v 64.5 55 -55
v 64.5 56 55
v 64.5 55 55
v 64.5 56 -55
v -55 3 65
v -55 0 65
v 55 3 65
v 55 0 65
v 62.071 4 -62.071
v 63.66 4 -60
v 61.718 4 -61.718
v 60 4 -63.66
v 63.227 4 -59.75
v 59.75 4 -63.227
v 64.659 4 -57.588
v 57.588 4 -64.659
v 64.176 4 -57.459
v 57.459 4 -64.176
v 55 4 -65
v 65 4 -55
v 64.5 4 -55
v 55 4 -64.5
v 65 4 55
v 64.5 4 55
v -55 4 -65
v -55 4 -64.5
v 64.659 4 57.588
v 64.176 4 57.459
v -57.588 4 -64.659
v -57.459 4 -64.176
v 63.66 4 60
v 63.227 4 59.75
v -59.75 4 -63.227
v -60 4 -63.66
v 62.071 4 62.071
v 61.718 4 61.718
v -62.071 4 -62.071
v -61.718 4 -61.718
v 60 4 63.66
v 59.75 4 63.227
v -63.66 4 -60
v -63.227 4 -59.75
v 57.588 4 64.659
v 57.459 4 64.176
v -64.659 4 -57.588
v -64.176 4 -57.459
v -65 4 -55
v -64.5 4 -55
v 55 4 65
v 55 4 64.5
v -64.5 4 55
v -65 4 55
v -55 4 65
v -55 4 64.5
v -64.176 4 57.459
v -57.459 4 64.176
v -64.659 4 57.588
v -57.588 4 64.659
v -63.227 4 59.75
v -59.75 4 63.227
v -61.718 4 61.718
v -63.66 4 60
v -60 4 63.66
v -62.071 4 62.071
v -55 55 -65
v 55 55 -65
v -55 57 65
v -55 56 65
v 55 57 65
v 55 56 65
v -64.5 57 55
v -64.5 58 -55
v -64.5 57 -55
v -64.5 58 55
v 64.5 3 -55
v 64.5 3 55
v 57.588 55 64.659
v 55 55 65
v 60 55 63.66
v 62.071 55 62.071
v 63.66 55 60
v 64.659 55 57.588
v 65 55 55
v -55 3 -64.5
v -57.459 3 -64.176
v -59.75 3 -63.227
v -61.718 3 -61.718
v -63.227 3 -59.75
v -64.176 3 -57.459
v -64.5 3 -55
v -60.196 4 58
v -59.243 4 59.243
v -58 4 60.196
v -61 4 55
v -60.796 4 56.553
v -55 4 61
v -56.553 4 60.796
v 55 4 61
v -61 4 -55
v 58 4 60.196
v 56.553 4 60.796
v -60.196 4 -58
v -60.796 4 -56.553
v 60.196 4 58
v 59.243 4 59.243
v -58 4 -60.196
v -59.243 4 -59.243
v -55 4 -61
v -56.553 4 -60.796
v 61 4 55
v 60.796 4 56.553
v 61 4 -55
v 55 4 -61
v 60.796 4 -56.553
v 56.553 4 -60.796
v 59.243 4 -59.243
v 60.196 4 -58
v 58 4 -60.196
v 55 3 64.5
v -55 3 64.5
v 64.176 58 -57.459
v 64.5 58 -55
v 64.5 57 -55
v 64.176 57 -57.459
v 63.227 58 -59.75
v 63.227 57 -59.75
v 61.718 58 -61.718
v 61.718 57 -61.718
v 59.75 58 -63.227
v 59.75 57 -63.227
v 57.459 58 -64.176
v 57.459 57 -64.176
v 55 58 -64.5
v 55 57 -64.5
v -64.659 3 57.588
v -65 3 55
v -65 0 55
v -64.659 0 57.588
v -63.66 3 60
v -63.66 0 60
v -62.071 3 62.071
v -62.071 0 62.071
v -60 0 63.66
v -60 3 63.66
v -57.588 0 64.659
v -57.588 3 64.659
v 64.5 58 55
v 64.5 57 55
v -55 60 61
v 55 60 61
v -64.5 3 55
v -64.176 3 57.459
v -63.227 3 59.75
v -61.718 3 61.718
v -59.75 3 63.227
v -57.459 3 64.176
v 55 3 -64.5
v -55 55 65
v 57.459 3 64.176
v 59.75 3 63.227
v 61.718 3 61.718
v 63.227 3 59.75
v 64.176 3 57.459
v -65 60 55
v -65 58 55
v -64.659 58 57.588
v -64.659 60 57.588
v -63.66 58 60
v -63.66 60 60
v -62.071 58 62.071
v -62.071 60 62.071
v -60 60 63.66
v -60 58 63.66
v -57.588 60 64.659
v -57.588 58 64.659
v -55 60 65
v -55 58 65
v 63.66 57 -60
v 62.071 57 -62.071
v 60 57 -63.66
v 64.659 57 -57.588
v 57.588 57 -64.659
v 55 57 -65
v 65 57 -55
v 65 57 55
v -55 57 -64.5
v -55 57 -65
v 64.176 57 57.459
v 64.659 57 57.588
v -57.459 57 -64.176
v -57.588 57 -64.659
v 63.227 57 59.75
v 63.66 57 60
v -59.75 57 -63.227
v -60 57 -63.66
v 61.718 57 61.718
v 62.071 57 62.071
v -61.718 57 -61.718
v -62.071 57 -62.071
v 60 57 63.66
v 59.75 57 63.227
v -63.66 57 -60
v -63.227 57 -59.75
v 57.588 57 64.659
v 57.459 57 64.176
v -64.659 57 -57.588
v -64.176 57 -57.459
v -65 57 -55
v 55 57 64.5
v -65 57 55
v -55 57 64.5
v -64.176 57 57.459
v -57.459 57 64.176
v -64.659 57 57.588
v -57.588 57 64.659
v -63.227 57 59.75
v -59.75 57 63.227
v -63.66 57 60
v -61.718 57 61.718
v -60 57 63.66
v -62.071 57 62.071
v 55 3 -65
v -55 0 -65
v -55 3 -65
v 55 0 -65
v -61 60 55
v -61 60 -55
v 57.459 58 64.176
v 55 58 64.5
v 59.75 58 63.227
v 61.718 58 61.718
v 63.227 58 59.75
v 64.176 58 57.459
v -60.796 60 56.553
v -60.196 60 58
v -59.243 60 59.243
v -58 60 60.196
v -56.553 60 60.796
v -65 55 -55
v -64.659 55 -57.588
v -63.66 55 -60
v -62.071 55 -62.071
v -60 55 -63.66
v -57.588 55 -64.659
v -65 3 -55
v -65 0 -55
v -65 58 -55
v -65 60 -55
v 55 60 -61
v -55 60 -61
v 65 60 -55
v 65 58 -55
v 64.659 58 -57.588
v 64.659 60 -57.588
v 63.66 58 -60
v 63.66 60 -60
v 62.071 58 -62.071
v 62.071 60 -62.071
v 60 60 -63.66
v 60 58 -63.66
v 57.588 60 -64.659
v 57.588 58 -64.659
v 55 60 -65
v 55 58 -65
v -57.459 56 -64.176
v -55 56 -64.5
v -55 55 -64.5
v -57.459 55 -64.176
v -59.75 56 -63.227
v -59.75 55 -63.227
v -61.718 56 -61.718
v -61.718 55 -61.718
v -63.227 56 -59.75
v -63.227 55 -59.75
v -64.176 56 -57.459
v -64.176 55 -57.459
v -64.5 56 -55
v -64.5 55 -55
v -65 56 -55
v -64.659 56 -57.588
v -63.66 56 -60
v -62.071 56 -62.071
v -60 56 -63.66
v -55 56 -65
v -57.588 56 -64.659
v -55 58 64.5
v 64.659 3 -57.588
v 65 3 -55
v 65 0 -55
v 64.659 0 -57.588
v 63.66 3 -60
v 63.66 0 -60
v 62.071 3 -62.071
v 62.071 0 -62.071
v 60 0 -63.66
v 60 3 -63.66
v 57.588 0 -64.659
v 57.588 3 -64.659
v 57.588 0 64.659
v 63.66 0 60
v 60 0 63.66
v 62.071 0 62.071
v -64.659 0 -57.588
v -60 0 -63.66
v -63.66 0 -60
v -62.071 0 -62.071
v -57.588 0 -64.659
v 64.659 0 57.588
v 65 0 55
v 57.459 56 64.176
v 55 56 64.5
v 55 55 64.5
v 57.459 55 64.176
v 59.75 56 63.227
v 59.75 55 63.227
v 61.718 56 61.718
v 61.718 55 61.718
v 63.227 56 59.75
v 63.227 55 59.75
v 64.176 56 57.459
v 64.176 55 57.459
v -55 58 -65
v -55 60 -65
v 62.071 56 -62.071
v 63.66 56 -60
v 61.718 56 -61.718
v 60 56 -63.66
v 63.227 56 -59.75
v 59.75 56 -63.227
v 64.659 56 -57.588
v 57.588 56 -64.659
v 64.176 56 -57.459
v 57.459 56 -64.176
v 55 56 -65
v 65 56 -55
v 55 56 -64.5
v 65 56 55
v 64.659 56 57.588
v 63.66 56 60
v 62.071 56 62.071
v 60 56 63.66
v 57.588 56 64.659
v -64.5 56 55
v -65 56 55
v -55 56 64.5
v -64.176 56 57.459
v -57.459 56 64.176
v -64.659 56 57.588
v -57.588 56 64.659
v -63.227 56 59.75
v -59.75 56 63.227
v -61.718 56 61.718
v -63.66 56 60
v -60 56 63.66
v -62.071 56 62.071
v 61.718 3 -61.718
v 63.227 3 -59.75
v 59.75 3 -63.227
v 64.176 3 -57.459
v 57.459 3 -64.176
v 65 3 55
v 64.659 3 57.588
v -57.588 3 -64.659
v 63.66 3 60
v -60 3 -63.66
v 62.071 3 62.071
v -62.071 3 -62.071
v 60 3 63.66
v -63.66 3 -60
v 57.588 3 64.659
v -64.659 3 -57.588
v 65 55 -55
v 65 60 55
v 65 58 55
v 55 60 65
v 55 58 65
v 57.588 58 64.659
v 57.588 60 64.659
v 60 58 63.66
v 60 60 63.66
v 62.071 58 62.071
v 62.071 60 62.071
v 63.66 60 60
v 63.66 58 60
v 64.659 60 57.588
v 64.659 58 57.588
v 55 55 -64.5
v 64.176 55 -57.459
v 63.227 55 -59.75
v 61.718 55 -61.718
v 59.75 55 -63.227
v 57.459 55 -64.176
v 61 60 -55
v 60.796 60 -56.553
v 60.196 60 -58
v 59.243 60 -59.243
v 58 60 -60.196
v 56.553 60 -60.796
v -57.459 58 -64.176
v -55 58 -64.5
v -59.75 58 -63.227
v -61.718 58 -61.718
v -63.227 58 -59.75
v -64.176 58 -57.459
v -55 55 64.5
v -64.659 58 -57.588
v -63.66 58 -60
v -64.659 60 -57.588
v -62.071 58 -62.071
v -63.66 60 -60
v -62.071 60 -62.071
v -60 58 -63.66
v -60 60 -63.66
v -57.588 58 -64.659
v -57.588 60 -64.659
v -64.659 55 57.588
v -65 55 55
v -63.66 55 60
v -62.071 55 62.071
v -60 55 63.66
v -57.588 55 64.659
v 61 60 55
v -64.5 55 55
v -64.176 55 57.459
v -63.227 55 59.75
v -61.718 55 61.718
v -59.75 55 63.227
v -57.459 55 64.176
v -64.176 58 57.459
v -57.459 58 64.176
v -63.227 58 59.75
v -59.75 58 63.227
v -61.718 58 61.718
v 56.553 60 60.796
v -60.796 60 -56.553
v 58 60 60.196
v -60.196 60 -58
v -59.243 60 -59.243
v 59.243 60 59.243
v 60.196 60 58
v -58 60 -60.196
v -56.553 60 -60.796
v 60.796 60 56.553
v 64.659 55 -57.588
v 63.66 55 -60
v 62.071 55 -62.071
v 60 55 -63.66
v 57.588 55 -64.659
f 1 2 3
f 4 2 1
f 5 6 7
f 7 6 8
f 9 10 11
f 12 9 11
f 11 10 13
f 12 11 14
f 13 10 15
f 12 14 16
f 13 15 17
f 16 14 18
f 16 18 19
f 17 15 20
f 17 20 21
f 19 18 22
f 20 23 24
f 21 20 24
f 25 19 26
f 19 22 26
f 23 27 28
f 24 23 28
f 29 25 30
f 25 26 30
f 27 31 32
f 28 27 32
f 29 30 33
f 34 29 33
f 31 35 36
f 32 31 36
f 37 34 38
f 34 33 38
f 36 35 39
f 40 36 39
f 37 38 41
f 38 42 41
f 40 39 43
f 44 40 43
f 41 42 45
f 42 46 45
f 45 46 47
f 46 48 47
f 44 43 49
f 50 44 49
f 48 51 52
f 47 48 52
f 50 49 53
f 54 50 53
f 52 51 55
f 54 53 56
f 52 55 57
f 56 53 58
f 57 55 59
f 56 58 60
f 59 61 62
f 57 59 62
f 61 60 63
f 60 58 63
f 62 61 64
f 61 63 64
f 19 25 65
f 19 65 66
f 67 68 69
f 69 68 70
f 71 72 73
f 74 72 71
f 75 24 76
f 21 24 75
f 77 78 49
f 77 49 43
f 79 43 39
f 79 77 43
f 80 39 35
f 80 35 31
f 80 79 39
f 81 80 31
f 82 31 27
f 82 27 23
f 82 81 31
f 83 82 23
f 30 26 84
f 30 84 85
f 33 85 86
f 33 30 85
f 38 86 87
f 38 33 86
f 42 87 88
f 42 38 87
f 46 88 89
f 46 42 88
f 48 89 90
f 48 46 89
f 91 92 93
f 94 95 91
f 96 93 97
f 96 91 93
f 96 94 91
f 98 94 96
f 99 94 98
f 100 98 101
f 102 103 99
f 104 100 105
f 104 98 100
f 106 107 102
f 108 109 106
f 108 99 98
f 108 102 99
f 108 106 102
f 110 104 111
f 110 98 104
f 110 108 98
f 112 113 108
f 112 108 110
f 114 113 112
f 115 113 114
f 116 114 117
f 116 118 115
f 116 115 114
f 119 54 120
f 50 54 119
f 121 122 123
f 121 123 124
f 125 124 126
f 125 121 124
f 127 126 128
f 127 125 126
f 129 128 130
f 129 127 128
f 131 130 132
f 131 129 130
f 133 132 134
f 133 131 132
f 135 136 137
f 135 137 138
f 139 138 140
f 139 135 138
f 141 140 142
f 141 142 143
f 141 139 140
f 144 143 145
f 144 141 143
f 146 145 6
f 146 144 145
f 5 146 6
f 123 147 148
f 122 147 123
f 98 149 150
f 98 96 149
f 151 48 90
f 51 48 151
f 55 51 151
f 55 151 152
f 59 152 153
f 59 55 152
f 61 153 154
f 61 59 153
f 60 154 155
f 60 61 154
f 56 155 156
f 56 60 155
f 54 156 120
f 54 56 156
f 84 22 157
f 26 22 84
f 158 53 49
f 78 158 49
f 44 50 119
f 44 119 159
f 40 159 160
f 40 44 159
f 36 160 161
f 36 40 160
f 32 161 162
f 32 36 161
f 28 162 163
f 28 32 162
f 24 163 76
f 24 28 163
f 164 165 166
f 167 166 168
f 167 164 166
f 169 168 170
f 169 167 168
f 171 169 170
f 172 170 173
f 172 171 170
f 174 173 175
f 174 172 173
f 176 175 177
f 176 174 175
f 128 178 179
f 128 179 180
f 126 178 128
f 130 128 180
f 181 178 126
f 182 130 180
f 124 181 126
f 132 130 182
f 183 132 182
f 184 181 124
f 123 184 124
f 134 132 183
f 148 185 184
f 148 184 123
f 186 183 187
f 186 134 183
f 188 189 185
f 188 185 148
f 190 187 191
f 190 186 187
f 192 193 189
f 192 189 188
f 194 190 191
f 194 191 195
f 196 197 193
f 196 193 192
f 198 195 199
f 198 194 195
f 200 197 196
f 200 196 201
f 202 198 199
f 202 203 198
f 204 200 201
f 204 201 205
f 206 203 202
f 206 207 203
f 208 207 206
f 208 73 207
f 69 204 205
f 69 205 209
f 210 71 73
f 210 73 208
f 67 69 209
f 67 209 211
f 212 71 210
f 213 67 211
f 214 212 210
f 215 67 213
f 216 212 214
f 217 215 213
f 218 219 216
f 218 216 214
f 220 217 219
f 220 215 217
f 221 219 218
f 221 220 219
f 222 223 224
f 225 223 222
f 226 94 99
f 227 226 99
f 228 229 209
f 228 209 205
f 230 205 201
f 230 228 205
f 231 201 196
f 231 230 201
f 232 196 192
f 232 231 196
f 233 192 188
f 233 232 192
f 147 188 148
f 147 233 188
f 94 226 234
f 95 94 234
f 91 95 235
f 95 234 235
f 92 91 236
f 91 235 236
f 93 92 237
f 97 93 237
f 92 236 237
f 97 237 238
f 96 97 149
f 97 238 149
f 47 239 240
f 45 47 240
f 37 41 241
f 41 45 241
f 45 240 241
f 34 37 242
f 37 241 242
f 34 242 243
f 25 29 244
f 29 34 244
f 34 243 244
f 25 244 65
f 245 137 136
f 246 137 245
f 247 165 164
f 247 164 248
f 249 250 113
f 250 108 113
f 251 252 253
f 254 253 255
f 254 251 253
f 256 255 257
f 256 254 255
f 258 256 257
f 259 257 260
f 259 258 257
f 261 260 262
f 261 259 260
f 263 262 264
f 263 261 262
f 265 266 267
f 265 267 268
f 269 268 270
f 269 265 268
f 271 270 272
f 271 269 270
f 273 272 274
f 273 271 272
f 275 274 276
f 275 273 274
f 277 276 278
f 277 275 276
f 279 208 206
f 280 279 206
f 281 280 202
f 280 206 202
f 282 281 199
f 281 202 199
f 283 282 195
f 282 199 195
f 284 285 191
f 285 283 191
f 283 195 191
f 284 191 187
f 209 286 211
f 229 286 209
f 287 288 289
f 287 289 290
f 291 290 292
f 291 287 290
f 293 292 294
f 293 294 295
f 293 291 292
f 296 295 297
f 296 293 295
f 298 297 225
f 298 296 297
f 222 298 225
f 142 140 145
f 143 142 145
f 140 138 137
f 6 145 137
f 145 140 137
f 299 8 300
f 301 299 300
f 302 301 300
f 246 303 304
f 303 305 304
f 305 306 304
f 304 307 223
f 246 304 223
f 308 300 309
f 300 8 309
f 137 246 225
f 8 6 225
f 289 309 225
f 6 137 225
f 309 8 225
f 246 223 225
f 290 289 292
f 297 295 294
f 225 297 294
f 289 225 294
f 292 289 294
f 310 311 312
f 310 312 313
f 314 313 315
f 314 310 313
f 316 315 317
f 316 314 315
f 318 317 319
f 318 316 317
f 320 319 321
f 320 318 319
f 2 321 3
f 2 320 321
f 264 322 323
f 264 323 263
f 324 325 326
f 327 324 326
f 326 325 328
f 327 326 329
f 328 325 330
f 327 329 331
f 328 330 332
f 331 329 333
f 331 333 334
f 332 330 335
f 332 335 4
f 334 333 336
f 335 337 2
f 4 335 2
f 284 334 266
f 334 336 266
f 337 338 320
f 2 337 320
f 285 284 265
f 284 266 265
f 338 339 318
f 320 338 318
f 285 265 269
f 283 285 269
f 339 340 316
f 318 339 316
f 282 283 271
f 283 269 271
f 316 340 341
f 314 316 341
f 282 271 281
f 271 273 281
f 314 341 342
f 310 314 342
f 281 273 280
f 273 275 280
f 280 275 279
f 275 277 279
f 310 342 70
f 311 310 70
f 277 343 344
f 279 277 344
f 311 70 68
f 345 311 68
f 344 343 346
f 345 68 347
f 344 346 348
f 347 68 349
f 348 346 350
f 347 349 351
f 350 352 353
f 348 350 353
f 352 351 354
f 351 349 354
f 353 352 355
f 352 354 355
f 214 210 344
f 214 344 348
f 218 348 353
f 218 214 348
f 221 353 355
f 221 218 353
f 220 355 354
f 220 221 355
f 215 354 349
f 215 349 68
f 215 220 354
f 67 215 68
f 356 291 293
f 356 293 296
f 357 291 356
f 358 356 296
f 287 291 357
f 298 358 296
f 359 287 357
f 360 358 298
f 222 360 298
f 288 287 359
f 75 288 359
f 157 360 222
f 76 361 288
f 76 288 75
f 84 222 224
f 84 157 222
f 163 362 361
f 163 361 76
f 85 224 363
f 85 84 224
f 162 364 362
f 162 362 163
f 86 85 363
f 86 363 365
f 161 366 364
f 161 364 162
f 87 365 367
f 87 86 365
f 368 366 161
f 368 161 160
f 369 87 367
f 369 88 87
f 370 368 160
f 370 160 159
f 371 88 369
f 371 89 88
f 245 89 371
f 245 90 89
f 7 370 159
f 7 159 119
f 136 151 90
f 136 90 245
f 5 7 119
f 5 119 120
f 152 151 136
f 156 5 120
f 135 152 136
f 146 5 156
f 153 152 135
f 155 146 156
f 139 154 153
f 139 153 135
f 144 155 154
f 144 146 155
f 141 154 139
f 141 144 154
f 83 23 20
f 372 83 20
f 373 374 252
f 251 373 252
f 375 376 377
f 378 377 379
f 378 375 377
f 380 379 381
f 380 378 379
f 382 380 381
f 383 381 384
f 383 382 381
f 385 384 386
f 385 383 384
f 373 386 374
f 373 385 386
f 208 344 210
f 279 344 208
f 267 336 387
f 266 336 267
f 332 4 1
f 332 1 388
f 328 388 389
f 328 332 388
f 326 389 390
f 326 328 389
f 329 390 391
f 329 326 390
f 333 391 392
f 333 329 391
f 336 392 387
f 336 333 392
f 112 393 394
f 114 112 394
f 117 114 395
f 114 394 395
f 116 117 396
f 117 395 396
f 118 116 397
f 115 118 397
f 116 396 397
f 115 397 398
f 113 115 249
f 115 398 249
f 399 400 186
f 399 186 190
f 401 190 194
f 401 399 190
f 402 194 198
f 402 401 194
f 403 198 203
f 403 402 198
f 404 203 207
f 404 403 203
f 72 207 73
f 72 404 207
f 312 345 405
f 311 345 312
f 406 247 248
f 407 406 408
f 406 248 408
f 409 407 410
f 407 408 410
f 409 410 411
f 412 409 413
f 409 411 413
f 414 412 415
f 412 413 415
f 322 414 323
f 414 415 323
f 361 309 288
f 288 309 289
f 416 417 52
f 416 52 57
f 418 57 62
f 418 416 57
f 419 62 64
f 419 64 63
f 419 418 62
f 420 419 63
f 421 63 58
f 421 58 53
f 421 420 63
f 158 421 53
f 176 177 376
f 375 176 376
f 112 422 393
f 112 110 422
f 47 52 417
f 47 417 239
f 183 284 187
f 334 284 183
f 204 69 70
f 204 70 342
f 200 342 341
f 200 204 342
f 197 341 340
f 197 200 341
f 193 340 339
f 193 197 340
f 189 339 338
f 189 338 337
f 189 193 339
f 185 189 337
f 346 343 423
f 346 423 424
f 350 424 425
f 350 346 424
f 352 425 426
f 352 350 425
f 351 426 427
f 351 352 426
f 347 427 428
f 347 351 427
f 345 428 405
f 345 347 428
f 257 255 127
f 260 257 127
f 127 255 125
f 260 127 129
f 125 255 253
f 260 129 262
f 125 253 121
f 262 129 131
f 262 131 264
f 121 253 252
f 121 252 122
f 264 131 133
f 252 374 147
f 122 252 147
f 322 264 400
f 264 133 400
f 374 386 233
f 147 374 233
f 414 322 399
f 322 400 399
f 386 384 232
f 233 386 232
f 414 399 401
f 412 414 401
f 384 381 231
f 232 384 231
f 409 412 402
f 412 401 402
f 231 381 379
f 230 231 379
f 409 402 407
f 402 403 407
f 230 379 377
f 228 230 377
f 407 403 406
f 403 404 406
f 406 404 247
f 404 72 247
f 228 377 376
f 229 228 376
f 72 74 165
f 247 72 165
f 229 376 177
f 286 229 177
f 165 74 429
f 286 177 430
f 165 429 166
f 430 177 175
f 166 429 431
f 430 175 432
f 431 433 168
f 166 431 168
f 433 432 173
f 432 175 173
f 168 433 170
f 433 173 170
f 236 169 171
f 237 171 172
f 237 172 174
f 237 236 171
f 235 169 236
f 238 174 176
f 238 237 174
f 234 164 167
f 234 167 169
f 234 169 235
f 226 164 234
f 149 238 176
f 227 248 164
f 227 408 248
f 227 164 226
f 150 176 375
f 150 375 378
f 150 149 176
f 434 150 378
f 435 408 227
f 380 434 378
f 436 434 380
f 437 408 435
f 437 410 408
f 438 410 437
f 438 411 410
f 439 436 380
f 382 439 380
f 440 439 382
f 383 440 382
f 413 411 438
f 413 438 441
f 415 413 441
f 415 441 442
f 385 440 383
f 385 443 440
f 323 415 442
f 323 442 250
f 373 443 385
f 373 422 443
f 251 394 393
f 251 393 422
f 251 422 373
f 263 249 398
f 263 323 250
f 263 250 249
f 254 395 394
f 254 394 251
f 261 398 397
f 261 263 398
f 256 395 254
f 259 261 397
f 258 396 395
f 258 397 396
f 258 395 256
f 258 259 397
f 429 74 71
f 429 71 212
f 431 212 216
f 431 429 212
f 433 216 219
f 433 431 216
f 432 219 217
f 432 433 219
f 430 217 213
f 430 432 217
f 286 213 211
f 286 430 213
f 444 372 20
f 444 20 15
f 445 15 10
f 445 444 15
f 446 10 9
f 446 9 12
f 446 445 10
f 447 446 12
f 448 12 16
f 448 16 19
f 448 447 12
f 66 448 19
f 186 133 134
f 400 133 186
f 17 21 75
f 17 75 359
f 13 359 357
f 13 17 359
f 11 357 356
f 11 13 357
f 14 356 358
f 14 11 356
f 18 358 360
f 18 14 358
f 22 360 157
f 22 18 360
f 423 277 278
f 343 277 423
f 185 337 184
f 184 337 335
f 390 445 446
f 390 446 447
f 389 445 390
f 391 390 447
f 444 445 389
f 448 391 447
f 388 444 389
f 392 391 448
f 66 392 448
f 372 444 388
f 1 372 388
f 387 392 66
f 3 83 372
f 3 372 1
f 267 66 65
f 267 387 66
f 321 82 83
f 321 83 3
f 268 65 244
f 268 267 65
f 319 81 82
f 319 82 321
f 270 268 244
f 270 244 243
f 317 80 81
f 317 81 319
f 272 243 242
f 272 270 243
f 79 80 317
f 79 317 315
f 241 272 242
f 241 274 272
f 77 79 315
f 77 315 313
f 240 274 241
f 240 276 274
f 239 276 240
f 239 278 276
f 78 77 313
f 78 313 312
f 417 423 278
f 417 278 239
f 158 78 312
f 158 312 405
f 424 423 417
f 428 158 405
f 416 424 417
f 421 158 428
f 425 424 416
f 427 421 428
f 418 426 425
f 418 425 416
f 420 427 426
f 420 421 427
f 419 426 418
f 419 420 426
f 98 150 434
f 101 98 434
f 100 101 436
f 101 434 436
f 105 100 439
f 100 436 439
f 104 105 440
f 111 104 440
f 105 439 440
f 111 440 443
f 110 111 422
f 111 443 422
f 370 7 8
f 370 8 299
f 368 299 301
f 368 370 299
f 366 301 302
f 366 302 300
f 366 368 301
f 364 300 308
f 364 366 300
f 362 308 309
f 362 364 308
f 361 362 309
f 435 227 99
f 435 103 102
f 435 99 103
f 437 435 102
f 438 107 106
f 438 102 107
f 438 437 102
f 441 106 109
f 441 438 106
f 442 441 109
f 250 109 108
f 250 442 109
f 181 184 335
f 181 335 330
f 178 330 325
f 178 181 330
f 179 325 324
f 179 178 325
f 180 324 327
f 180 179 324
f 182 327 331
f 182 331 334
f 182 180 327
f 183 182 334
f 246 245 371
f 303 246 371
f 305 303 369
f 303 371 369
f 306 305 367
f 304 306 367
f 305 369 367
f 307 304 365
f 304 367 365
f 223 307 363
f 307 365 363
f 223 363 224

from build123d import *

# Parameters (mm, degrees)
CROQUIS1_W              = 130
CROQUIS1_H              = 130
SALIENTE_EXTRUIR1_DEPTH = 60
REDONDEO1_R             = 10
VACIADO1_T              = -4
CORTAR_EXTRUIR1_START   = -58
CORTAR_EXTRUIR1_DEPTH   = 1
CORTAR_EXTRUIR2_START   = -56
CORTAR_EXTRUIR2_DEPTH   = 1
CORTAR_EXTRUIR3_START   = -4
CORTAR_EXTRUIR3_DEPTH   = 1


with BuildPart() as part:
    # Croquis1 → Saliente-Extruir1 (new body)
    with BuildSketch(Plane(origin=(0, 0, 0), x_dir=(1, 0, 0), z_dir=(0, 1, 0))):
        Rectangle(CROQUIS1_W, CROQUIS1_H)
    extrude(amount=SALIENTE_EXTRUIR1_DEPTH)

    # Redondeo1
    redondeo1_edges = [part.edges().sort_by_distance(p)[0] for p in [
        (-65, 30, -65),
        (65, 30, -65),
        (65, 30, 65),
        (-65, 30, 65),
    ]]
    fillet(redondeo1_edges, radius=REDONDEO1_R)

    # Vaciado1
    vaciado1_openings = [part.faces().sort_by_distance(p)[0] for p in [
        (0, 60, 0),
    ]]
    offset(amount=VACIADO1_T, openings=vaciado1_openings, kind=Kind.INTERSECTION)

    # Croquis2 → Cortar-Extruir1 (cut)
    with BuildSketch(Plane.XZ.offset(CORTAR_EXTRUIR1_START)):
        with BuildLine():
            Line((55, -65), (-55, -65))
            ThreePointArc((-55, -65), (-62.071067812, -62.071067812), (-65, -55))
            Line((-65, -55), (-65, 55))
            ThreePointArc((-65, 55), (-62.071067812, 62.071067812), (-55, 65))
            Line((-55, 65), (55, 65))
            ThreePointArc((55, 65), (62.071067812, 62.071067812), (65, 55))
            Line((65, 55), (65, -55))
            ThreePointArc((65, -55), (62.071067812, -62.071067812), (55, -65))
        make_face()
        with BuildLine():
            Line((55, -64.5), (-55, -64.5))
            ThreePointArc((-55, -64.5), (-61.717514421, -61.717514421), (-64.5, -55))
            Line((-64.5, -55), (-64.5, 55))
            ThreePointArc((-64.5, 55), (-61.717514421, 61.717514421), (-55, 64.5))
            Line((-55, 64.5), (55, 64.5))
            ThreePointArc((55, 64.5), (61.717514421, 61.717514421), (64.5, 55))
            Line((64.5, 55), (64.5, -55))
            ThreePointArc((64.5, -55), (61.717514421, -61.717514421), (55, -64.5))
        make_face(mode=Mode.SUBTRACT)
    extrude(amount=CORTAR_EXTRUIR1_DEPTH, mode=Mode.SUBTRACT)

    # Croquis2<2> → Cortar-Extruir2 (cut)
    with BuildSketch(Plane.XZ.offset(CORTAR_EXTRUIR2_START)):
        with BuildLine():
            Line((55, -65), (-55, -65))
            ThreePointArc((-55, -65), (-62.071067812, -62.071067812), (-65, -55))
            Line((-65, -55), (-65, 55))
            ThreePointArc((-65, 55), (-62.071067812, 62.071067812), (-55, 65))
            Line((-55, 65), (55, 65))
            ThreePointArc((55, 65), (62.071067812, 62.071067812), (65, 55))
            Line((65, 55), (65, -55))
            ThreePointArc((65, -55), (62.071067812, -62.071067812), (55, -65))
        make_face()
        with BuildLine():
            Line((55, -64.5), (-55, -64.5))
            ThreePointArc((-55, -64.5), (-61.717514421, -61.717514421), (-64.5, -55))
            Line((-64.5, -55), (-64.5, 55))
            ThreePointArc((-64.5, 55), (-61.717514421, 61.717514421), (-55, 64.5))
            Line((-55, 64.5), (55, 64.5))
            ThreePointArc((55, 64.5), (61.717514421, 61.717514421), (64.5, 55))
            Line((64.5, 55), (64.5, -55))
            ThreePointArc((64.5, -55), (61.717514421, -61.717514421), (55, -64.5))
        make_face(mode=Mode.SUBTRACT)
    extrude(amount=CORTAR_EXTRUIR2_DEPTH, mode=Mode.SUBTRACT)

    # Croquis2<3> → Cortar-Extruir3 (cut)
    with BuildSketch(Plane.XZ.offset(CORTAR_EXTRUIR3_START)):
        with BuildLine():
            Line((55, -65), (-55, -65))
            ThreePointArc((-55, -65), (-62.071067812, -62.071067812), (-65, -55))
            Line((-65, -55), (-65, 55))
            ThreePointArc((-65, 55), (-62.071067812, 62.071067812), (-55, 65))
            Line((-55, 65), (55, 65))
            ThreePointArc((55, 65), (62.071067812, 62.071067812), (65, 55))
            Line((65, 55), (65, -55))
            ThreePointArc((65, -55), (62.071067812, -62.071067812), (55, -65))
        make_face()
        with BuildLine():
            Line((55, -64.5), (-55, -64.5))
            ThreePointArc((-55, -64.5), (-61.717514421, -61.717514421), (-64.5, -55))
            Line((-64.5, -55), (-64.5, 55))
            ThreePointArc((-64.5, 55), (-61.717514421, 61.717514421), (-55, 64.5))
            Line((-55, 64.5), (55, 64.5))
            ThreePointArc((55, 64.5), (61.717514421, 61.717514421), (64.5, 55))
            Line((64.5, 55), (64.5, -55))
            ThreePointArc((64.5, -55), (61.717514421, -61.717514421), (55, -64.5))
        make_face(mode=Mode.SUBTRACT)
    extrude(amount=CORTAR_EXTRUIR3_DEPTH, mode=Mode.SUBTRACT)


solid = part.part
